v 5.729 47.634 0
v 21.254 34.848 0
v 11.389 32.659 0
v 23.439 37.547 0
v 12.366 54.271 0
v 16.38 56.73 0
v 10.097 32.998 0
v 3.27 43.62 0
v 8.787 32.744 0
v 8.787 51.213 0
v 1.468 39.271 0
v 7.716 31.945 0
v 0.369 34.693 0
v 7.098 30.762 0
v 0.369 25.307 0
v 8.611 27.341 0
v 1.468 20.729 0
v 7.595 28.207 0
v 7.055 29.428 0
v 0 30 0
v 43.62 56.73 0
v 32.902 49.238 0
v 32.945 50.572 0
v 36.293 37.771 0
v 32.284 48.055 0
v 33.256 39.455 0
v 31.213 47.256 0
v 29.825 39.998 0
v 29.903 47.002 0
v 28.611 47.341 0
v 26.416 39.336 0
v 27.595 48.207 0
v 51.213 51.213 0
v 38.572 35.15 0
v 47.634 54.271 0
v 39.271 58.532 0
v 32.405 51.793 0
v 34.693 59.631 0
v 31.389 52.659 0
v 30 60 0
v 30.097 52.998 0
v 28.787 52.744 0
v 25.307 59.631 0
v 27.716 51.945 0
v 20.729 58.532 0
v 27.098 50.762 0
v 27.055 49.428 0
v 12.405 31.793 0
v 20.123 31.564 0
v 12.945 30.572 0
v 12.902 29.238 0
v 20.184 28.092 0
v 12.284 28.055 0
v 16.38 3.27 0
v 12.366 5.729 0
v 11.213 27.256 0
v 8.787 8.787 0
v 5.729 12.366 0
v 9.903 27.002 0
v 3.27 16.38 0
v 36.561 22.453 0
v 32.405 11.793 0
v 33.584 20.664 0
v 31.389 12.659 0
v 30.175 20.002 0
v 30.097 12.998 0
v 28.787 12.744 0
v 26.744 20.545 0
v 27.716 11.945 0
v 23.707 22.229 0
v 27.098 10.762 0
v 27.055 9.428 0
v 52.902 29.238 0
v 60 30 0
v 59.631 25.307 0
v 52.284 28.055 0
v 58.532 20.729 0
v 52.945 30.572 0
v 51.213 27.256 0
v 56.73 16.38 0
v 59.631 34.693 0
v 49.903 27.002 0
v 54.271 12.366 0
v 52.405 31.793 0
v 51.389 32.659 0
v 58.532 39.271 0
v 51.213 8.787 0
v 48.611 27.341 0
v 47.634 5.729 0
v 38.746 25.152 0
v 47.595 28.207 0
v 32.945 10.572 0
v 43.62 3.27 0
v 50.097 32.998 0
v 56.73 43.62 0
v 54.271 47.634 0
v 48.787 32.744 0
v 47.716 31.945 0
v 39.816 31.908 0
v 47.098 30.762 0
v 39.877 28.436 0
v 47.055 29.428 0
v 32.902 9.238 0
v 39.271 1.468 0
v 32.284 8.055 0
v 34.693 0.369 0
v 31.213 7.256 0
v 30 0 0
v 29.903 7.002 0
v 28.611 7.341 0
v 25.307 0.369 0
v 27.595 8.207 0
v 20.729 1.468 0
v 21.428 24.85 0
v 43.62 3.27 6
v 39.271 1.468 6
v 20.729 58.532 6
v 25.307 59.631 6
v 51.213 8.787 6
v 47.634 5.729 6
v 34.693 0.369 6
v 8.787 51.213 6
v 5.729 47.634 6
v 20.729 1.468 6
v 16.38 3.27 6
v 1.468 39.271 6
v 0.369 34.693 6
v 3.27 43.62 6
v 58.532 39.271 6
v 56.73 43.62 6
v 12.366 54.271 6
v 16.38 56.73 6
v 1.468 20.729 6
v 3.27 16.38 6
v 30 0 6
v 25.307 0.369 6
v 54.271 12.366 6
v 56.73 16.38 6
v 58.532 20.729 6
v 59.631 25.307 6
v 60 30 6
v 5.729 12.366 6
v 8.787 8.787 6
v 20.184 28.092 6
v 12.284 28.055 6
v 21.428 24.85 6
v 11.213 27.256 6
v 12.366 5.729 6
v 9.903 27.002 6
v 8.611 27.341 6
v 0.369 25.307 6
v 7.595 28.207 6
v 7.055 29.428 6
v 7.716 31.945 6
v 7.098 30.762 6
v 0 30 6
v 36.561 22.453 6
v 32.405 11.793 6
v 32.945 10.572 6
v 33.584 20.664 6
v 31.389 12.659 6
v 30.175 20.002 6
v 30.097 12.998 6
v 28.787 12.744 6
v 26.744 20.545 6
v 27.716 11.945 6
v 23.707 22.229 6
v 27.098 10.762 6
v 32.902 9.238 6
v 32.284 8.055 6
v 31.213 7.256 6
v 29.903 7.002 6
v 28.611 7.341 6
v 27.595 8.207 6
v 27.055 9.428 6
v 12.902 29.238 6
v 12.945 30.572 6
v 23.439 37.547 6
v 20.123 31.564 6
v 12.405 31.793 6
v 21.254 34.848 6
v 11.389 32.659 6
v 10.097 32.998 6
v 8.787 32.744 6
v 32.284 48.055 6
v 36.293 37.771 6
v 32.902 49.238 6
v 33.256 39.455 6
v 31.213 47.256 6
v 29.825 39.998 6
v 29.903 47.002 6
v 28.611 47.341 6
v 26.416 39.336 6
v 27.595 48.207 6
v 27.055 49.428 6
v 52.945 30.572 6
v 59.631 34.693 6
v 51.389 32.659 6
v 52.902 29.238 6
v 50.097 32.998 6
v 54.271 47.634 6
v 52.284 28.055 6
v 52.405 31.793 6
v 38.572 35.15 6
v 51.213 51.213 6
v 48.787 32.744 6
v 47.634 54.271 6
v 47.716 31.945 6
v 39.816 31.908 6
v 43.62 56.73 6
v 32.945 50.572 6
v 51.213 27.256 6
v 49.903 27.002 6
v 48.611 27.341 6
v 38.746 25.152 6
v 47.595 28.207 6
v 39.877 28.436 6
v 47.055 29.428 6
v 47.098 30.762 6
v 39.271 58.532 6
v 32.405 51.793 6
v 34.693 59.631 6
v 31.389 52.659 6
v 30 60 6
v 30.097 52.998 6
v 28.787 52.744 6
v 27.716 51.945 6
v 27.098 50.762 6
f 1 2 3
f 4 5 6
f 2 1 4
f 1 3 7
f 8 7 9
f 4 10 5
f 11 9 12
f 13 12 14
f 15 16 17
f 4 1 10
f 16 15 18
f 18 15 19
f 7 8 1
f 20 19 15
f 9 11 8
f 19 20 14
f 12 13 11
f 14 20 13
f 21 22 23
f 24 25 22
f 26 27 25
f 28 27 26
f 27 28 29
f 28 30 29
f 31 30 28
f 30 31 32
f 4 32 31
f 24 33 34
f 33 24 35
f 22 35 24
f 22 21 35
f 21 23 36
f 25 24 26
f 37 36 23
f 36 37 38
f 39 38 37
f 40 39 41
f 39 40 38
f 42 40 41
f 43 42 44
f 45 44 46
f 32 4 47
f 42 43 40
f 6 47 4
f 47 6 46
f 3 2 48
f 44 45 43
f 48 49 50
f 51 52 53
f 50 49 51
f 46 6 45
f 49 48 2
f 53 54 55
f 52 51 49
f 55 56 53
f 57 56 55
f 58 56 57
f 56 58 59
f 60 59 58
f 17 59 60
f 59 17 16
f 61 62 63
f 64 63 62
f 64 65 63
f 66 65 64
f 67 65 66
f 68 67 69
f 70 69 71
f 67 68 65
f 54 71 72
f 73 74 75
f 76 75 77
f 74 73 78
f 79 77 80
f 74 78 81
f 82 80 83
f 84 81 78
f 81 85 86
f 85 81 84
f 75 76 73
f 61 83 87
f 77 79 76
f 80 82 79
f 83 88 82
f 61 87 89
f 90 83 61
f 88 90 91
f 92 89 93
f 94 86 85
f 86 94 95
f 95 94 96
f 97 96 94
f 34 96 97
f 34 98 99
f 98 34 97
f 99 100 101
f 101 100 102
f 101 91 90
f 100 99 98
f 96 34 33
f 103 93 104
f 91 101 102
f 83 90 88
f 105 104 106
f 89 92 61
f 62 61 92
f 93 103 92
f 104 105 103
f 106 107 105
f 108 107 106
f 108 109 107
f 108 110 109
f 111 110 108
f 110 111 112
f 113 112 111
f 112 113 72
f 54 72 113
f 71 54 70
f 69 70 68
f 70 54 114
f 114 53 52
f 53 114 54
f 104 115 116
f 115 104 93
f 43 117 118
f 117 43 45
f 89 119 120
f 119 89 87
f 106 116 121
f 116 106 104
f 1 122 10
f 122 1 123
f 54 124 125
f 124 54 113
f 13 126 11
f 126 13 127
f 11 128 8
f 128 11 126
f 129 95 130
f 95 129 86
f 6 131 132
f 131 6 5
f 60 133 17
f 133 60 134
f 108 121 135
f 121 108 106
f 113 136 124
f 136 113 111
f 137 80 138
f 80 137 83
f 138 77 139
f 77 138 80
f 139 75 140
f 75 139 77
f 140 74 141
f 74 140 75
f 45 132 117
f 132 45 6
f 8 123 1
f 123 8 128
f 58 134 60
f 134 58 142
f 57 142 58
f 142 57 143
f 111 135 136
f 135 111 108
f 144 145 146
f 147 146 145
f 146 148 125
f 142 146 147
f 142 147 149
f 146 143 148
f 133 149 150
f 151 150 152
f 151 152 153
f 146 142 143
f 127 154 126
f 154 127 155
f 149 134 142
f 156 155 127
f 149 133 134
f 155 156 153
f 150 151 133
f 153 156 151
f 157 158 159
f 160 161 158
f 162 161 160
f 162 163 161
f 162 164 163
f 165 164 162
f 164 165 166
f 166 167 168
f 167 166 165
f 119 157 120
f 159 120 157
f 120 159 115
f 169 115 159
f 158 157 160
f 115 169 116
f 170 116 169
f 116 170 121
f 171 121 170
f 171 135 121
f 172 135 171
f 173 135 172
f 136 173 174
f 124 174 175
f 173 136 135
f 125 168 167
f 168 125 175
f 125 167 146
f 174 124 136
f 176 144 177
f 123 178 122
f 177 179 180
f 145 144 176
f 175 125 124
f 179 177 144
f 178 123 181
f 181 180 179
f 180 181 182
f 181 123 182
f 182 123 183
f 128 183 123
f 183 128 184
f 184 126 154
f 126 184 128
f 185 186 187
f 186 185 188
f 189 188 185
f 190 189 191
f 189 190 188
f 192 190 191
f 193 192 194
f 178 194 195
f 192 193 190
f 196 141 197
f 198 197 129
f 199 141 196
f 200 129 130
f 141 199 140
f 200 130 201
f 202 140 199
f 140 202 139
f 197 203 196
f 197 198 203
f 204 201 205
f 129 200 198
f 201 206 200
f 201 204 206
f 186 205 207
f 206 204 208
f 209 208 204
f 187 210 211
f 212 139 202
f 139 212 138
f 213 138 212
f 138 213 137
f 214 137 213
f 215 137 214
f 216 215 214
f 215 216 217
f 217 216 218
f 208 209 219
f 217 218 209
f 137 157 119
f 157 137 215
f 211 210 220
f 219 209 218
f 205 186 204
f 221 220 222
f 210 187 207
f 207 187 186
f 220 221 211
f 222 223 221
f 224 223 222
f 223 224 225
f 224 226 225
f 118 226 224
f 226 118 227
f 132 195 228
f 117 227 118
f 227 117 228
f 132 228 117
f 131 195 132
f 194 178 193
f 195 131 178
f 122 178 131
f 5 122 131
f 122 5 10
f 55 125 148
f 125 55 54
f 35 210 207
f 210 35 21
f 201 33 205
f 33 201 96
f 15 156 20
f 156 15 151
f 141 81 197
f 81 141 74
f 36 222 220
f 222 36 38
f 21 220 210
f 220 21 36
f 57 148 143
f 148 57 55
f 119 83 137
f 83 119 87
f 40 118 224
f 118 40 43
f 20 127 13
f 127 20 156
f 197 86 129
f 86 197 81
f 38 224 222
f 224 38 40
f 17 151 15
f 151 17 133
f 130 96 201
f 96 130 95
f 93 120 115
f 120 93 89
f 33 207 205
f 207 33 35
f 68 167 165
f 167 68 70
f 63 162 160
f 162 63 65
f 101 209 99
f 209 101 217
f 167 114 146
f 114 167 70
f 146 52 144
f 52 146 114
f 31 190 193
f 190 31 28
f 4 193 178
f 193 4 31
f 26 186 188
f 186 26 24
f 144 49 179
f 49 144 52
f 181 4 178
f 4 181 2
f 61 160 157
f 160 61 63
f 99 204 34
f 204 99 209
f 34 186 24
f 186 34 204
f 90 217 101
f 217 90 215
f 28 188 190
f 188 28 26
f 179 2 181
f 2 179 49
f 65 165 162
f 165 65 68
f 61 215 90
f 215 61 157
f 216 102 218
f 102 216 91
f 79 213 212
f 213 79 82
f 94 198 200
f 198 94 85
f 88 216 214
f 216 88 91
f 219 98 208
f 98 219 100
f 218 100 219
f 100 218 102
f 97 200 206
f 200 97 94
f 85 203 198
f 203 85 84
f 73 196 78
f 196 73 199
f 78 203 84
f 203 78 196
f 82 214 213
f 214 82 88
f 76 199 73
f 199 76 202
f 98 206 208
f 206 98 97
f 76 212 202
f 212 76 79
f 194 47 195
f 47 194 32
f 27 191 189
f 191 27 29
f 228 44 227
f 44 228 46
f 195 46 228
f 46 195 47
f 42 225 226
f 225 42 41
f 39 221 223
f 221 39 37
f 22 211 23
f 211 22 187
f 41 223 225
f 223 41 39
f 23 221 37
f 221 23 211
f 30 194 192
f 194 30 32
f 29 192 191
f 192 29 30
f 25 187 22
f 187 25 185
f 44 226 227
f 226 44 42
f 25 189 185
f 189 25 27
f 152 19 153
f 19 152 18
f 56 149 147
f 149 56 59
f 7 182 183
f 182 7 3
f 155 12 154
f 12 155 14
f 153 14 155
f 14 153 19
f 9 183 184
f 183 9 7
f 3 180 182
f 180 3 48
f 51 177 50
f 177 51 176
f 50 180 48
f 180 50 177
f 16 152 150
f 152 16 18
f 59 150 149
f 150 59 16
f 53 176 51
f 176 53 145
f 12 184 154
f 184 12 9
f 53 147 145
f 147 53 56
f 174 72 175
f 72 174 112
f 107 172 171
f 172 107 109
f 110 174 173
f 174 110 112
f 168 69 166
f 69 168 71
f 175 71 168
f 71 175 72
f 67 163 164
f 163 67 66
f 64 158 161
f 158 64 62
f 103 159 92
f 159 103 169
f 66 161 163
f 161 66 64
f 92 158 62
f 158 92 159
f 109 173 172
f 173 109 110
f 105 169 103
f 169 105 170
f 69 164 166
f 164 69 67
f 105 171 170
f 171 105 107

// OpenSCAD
$fn = 32;

// ----------------------------------------------------------------------
// Spacer plate: round flange R30, 4 bolts
// ----------------------------------------------------------------------

// --- parameters (mm) ---
bore_r = 10;              // centre bore radius
bolt_r = 3;               // bolt hole radius
plate_t = 6;              // plate thickness, Z (extrusion height)
flange_r = 30;            // flange radius
n_bolt = 4;               // bolt hole count
ring_r = 20;              // bolt circle radius

profile = [[60, 30], [59.631, 34.693], [58.532, 39.271], [56.73, 43.62], [54.271, 47.634], [51.213, 51.213], [47.634, 54.271], [43.62, 56.73], [39.271, 58.532], [34.693, 59.631], [30, 60], [25.307, 59.631], [20.729, 58.532], [16.38, 56.73], [12.366, 54.271], [8.787, 51.213], [5.729, 47.634], [3.27, 43.62], [1.468, 39.271], [0.369, 34.693], [0, 30], [0.369, 25.307], [1.468, 20.729], [3.27, 16.38], [5.729, 12.366], [8.787, 8.787], [12.366, 5.729], [16.38, 3.27], [20.729, 1.468], [25.307, 0.369], [30, 0], [34.693, 0.369], [39.271, 1.468], [43.62, 3.27], [47.634, 5.729], [51.213, 8.787], [54.271, 12.366], [56.73, 16.38], [58.532, 20.729], [59.631, 25.307]];  // primary outline, 40 points, counter clockwise
void_1 = [[39.816, 31.908], [38.572, 35.15], [36.293, 37.771], [33.256, 39.455], [29.825, 39.998], [26.416, 39.336], [23.439, 37.547], [21.254, 34.848], [20.123, 31.564], [20.184, 28.092], [21.428, 24.85], [23.707, 22.229], [26.744, 20.545], [30.175, 20.002], [33.584, 20.664], [36.561, 22.453], [38.746, 25.152], [39.877, 28.436]];  // centre bore, 18 points
void_2 = [[52.945, 30.572], [52.405, 31.793], [51.389, 32.659], [50.097, 32.998], [48.787, 32.744], [47.716, 31.945], [47.098, 30.762], [47.055, 29.428], [47.595, 28.207], [48.611, 27.341], [49.903, 27.002], [51.213, 27.256], [52.284, 28.055], [52.902, 29.238]];  // bolt hole 1, 14 points
void_3 = [[32.945, 50.572], [32.405, 51.793], [31.389, 52.659], [30.097, 52.998], [28.787, 52.744], [27.716, 51.945], [27.098, 50.762], [27.055, 49.428], [27.595, 48.207], [28.611, 47.341], [29.903, 47.002], [31.213, 47.256], [32.284, 48.055], [32.902, 49.238]];  // bolt hole 2, 14 points
void_4 = [[12.945, 30.572], [12.405, 31.793], [11.389, 32.659], [10.097, 32.998], [8.787, 32.744], [7.716, 31.945], [7.098, 30.762], [7.055, 29.428], [7.595, 28.207], [8.611, 27.341], [9.903, 27.002], [11.213, 27.256], [12.284, 28.055], [12.902, 29.238]];  // bolt hole 3, 14 points
void_5 = [[32.945, 10.572], [32.405, 11.793], [31.389, 12.659], [30.097, 12.998], [28.787, 12.744], [27.716, 11.945], [27.098, 10.762], [27.055, 9.428], [27.595, 8.207], [28.611, 7.341], [29.903, 7.002], [31.213, 7.256], [32.284, 8.055], [32.902, 9.238]];  // bolt hole 4, 14 points

// --- the one profile operation ---
difference() {
  linear_extrude(height = plate_t) polygon(points = profile);
  translate([0, 0, -1])
    linear_extrude(height = plate_t + 2) polygon(points = void_1);
  translate([0, 0, -1])
    linear_extrude(height = plate_t + 2) polygon(points = void_2);
  translate([0, 0, -1])
    linear_extrude(height = plate_t + 2) polygon(points = void_3);
  translate([0, 0, -1])
    linear_extrude(height = plate_t + 2) polygon(points = void_4);
  translate([0, 0, -1])
    linear_extrude(height = plate_t + 2) polygon(points = void_5);
}
